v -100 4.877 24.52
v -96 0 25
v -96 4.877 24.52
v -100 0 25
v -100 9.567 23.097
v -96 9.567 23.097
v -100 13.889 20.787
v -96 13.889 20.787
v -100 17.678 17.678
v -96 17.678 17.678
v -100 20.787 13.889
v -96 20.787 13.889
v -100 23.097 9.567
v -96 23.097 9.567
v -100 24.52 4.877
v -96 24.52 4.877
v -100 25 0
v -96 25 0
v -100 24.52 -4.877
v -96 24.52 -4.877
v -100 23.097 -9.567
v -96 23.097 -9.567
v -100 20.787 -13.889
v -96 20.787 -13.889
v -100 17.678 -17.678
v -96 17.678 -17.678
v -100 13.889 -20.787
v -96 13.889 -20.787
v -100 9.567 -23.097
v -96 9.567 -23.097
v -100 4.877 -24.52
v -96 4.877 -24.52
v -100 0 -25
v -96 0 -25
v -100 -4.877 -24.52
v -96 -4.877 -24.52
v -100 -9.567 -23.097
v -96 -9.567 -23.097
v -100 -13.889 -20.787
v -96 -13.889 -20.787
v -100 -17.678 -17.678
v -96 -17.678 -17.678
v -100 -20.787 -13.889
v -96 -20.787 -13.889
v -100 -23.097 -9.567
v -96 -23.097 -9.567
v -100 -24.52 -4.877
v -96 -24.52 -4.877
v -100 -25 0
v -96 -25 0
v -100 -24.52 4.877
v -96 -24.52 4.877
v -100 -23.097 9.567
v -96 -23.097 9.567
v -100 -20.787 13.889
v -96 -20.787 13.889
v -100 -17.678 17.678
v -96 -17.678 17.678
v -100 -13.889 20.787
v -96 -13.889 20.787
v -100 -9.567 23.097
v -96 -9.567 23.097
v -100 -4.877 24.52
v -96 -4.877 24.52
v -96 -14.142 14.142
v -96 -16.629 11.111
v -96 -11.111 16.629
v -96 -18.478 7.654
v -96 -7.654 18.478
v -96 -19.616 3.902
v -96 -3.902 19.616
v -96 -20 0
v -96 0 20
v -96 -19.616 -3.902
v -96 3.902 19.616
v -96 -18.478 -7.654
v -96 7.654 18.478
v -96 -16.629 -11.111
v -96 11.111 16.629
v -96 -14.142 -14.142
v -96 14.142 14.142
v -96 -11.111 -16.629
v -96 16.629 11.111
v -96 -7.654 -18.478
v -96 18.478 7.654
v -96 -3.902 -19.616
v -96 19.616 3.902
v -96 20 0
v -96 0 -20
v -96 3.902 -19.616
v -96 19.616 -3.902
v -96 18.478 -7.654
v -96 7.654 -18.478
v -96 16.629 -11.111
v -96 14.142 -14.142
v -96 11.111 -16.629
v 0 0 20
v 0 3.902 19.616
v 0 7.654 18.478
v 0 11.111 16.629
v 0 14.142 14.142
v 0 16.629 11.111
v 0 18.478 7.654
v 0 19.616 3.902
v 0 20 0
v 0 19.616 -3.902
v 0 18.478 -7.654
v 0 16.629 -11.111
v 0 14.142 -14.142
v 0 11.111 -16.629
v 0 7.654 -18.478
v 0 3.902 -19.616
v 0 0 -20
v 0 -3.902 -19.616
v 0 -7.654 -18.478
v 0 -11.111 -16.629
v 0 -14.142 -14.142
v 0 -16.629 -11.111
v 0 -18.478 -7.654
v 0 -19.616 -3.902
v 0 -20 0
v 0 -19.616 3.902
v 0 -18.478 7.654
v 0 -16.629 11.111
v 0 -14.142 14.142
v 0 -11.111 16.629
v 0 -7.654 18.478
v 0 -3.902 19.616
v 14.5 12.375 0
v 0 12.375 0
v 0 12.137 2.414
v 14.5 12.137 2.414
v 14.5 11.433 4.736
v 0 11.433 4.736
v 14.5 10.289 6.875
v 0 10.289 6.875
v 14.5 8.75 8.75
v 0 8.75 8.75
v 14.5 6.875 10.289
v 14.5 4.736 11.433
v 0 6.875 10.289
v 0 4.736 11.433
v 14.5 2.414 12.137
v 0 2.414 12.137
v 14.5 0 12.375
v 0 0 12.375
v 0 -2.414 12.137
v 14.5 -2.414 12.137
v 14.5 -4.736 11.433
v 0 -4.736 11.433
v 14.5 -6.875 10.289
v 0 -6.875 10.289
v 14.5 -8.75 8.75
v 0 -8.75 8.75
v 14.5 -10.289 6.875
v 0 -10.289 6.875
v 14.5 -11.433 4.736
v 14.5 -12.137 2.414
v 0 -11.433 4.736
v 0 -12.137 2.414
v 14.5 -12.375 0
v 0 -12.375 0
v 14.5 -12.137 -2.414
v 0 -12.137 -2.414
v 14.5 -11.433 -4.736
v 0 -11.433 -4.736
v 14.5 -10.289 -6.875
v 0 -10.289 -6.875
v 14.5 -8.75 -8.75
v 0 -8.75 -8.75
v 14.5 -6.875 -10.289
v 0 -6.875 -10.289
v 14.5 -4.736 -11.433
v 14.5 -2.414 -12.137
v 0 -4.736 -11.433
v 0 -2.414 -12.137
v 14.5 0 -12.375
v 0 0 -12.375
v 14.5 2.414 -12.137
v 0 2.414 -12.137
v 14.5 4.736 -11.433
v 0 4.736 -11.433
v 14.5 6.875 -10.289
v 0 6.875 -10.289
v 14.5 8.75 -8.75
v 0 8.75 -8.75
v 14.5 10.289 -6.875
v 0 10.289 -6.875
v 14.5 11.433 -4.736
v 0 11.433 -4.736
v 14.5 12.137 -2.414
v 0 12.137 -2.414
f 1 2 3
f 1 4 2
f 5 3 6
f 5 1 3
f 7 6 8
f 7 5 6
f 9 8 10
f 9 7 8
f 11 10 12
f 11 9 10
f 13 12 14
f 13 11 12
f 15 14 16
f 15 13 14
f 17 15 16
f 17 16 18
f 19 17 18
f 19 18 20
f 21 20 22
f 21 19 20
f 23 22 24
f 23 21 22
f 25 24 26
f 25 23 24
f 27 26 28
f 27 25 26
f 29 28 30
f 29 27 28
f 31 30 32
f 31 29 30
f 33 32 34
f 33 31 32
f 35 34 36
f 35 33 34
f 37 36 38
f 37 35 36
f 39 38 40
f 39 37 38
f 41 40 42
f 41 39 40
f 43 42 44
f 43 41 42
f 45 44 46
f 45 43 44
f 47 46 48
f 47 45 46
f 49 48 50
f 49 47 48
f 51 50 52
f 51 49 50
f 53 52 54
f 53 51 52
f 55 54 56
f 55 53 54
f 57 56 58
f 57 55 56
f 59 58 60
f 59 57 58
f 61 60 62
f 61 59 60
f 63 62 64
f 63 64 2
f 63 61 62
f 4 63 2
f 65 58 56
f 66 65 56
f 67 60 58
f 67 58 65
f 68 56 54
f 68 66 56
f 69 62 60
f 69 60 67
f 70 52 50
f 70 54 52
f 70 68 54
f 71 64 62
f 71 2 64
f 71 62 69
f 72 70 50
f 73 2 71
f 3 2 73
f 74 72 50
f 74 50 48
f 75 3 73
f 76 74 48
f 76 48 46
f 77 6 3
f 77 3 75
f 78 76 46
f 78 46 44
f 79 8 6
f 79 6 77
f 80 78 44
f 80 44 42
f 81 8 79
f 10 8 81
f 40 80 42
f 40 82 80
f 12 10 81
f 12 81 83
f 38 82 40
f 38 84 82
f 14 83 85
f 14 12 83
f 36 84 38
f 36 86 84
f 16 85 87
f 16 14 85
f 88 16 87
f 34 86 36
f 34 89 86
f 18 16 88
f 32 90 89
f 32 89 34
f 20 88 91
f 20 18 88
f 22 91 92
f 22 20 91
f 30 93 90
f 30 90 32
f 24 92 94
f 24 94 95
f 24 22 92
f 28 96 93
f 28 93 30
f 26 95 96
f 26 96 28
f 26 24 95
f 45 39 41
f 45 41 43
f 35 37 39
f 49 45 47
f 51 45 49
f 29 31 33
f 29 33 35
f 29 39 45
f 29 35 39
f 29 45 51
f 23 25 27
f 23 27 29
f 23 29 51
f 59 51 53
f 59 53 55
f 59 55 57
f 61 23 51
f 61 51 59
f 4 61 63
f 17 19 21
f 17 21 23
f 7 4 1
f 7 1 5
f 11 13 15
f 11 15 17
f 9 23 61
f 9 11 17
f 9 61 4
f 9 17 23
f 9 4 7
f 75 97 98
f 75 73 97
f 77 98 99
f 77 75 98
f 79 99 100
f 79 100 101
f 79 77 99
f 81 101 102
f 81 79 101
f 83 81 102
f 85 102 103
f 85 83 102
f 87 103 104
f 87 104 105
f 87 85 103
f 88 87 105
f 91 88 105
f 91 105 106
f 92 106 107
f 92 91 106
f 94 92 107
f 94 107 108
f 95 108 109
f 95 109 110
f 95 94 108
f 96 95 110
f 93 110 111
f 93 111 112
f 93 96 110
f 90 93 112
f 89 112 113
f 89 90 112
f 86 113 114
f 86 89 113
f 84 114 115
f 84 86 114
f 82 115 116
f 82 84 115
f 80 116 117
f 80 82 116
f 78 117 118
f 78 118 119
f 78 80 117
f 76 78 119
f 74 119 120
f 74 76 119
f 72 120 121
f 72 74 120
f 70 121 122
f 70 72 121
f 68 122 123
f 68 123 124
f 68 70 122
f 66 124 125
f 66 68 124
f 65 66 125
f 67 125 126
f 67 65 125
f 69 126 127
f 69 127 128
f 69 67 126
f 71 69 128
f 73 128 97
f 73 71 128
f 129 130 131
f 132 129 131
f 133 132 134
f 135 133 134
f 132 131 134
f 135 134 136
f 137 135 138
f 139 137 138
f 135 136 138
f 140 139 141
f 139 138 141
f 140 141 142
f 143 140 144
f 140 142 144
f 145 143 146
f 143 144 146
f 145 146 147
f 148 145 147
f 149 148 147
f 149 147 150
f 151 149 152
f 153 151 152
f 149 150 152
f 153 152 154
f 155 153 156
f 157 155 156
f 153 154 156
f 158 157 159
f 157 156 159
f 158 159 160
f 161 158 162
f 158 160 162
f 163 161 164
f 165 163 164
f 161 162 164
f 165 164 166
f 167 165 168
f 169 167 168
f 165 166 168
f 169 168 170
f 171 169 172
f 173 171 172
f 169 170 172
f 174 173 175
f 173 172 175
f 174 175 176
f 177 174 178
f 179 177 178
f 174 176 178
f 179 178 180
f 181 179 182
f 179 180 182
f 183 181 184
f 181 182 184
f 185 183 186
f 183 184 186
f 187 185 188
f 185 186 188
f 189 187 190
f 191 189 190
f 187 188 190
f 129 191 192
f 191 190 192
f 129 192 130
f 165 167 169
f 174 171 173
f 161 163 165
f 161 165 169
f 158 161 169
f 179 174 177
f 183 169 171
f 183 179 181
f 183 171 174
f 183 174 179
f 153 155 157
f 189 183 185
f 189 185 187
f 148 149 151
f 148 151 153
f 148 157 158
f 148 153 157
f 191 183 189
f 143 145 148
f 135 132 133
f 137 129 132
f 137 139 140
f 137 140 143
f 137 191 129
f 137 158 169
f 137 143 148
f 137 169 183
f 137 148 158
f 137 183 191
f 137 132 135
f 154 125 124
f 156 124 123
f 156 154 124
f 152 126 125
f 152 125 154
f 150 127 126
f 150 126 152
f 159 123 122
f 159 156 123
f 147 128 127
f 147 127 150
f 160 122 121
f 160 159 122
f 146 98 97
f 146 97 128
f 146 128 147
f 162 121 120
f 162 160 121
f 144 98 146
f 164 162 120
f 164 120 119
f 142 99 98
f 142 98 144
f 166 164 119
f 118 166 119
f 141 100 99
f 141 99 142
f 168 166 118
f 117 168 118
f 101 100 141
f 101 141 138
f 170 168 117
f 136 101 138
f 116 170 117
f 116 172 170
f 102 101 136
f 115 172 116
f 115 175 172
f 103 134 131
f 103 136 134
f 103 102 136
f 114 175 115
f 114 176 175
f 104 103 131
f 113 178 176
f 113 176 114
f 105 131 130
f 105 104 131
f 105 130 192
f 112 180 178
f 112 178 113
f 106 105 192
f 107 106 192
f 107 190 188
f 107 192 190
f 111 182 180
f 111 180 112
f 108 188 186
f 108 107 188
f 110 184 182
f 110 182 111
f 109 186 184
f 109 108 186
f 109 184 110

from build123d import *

# Parameters (mm, degrees)
F2_R     = 12.375
F3_DEPTH = 14.5


with BuildPart() as f1:
    # F0 (on Front) → F1 (revolve)
    with BuildSketch(Plane.XZ):
        Polygon((-100, 0), (0, 0), (0, 20), (-96, 20), (-96, 25), (-100, 25), (-100, 20), align=None)
    revolve(axis=Axis((-50, 0, 0), (-1, 0, 0)))

    # F2 (on face) → F3 (join)
    with BuildSketch(Plane.YZ):
        Circle(F2_R)
    extrude(amount=F3_DEPTH)


solid = f1.part
